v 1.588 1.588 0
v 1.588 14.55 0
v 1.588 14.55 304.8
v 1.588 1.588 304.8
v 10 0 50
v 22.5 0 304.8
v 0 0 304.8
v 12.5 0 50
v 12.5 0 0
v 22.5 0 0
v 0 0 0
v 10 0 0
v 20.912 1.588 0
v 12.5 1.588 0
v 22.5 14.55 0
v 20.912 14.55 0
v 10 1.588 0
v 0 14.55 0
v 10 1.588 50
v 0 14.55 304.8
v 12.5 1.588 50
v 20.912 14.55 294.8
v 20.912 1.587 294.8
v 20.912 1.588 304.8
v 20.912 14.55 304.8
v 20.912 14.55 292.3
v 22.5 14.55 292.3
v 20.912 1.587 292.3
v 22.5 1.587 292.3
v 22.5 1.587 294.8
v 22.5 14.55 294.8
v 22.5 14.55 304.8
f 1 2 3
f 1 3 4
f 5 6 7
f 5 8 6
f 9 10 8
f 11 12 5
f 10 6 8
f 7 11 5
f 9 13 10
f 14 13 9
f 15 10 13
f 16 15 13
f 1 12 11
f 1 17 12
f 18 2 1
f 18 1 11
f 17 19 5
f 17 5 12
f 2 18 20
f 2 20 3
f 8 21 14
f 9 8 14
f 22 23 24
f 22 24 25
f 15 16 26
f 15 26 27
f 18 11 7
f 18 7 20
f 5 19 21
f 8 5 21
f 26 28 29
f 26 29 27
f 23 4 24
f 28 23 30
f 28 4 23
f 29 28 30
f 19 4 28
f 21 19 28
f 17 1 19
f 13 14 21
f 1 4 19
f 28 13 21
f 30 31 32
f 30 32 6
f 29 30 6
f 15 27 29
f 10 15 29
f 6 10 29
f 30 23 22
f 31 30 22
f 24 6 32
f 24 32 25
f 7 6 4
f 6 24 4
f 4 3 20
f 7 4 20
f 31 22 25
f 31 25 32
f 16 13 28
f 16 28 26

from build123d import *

# Parameters (mm, degrees)
BOSS_EXTRUDE1_DEPTH = 304.8
SKETCH3_W           = 2.5
SKETCH3_H           = 12.9625
CUT_EXTRUDE1_DEPTH  = 2.5875
SKETCH4_W           = 2.5
SKETCH4_H           = 50
CUT_EXTRUDE2_DEPTH  = 2.5875


with BuildPart() as part:
    # Sketch1 → Boss-Extrude1 (new body)
    with BuildSketch(Plane.XY):
        Polygon((0, 0), (0, 14.55), (1.5875, 14.55), (1.5875, 1.5875), (20.9125, 1.5875), (20.9125, 14.55), (22.5, 14.55), (22.5, 0), align=None)
    extrude(amount=BOSS_EXTRUDE1_DEPTH)

    # Sketch3 → Cut-Extrude1 (cut, through all)
    with BuildSketch(Plane.ZY.offset(-20.9125)):
        with Locations((293.55, 8.06875)):
            Rectangle(SKETCH3_W, SKETCH3_H)
    extrude(amount=-CUT_EXTRUDE1_DEPTH, mode=Mode.SUBTRACT)

    # Sketch4 → Cut-Extrude2 (cut, through all)
    with BuildSketch(Plane(origin=(0, 1.5875, 0), x_dir=(1, 0, 0), z_dir=(0, 1, 0))):
        with Locations((11.25, -25)):
            Rectangle(SKETCH4_W, SKETCH4_H)
    extrude(amount=-CUT_EXTRUDE2_DEPTH, mode=Mode.SUBTRACT)


solid = part.part
